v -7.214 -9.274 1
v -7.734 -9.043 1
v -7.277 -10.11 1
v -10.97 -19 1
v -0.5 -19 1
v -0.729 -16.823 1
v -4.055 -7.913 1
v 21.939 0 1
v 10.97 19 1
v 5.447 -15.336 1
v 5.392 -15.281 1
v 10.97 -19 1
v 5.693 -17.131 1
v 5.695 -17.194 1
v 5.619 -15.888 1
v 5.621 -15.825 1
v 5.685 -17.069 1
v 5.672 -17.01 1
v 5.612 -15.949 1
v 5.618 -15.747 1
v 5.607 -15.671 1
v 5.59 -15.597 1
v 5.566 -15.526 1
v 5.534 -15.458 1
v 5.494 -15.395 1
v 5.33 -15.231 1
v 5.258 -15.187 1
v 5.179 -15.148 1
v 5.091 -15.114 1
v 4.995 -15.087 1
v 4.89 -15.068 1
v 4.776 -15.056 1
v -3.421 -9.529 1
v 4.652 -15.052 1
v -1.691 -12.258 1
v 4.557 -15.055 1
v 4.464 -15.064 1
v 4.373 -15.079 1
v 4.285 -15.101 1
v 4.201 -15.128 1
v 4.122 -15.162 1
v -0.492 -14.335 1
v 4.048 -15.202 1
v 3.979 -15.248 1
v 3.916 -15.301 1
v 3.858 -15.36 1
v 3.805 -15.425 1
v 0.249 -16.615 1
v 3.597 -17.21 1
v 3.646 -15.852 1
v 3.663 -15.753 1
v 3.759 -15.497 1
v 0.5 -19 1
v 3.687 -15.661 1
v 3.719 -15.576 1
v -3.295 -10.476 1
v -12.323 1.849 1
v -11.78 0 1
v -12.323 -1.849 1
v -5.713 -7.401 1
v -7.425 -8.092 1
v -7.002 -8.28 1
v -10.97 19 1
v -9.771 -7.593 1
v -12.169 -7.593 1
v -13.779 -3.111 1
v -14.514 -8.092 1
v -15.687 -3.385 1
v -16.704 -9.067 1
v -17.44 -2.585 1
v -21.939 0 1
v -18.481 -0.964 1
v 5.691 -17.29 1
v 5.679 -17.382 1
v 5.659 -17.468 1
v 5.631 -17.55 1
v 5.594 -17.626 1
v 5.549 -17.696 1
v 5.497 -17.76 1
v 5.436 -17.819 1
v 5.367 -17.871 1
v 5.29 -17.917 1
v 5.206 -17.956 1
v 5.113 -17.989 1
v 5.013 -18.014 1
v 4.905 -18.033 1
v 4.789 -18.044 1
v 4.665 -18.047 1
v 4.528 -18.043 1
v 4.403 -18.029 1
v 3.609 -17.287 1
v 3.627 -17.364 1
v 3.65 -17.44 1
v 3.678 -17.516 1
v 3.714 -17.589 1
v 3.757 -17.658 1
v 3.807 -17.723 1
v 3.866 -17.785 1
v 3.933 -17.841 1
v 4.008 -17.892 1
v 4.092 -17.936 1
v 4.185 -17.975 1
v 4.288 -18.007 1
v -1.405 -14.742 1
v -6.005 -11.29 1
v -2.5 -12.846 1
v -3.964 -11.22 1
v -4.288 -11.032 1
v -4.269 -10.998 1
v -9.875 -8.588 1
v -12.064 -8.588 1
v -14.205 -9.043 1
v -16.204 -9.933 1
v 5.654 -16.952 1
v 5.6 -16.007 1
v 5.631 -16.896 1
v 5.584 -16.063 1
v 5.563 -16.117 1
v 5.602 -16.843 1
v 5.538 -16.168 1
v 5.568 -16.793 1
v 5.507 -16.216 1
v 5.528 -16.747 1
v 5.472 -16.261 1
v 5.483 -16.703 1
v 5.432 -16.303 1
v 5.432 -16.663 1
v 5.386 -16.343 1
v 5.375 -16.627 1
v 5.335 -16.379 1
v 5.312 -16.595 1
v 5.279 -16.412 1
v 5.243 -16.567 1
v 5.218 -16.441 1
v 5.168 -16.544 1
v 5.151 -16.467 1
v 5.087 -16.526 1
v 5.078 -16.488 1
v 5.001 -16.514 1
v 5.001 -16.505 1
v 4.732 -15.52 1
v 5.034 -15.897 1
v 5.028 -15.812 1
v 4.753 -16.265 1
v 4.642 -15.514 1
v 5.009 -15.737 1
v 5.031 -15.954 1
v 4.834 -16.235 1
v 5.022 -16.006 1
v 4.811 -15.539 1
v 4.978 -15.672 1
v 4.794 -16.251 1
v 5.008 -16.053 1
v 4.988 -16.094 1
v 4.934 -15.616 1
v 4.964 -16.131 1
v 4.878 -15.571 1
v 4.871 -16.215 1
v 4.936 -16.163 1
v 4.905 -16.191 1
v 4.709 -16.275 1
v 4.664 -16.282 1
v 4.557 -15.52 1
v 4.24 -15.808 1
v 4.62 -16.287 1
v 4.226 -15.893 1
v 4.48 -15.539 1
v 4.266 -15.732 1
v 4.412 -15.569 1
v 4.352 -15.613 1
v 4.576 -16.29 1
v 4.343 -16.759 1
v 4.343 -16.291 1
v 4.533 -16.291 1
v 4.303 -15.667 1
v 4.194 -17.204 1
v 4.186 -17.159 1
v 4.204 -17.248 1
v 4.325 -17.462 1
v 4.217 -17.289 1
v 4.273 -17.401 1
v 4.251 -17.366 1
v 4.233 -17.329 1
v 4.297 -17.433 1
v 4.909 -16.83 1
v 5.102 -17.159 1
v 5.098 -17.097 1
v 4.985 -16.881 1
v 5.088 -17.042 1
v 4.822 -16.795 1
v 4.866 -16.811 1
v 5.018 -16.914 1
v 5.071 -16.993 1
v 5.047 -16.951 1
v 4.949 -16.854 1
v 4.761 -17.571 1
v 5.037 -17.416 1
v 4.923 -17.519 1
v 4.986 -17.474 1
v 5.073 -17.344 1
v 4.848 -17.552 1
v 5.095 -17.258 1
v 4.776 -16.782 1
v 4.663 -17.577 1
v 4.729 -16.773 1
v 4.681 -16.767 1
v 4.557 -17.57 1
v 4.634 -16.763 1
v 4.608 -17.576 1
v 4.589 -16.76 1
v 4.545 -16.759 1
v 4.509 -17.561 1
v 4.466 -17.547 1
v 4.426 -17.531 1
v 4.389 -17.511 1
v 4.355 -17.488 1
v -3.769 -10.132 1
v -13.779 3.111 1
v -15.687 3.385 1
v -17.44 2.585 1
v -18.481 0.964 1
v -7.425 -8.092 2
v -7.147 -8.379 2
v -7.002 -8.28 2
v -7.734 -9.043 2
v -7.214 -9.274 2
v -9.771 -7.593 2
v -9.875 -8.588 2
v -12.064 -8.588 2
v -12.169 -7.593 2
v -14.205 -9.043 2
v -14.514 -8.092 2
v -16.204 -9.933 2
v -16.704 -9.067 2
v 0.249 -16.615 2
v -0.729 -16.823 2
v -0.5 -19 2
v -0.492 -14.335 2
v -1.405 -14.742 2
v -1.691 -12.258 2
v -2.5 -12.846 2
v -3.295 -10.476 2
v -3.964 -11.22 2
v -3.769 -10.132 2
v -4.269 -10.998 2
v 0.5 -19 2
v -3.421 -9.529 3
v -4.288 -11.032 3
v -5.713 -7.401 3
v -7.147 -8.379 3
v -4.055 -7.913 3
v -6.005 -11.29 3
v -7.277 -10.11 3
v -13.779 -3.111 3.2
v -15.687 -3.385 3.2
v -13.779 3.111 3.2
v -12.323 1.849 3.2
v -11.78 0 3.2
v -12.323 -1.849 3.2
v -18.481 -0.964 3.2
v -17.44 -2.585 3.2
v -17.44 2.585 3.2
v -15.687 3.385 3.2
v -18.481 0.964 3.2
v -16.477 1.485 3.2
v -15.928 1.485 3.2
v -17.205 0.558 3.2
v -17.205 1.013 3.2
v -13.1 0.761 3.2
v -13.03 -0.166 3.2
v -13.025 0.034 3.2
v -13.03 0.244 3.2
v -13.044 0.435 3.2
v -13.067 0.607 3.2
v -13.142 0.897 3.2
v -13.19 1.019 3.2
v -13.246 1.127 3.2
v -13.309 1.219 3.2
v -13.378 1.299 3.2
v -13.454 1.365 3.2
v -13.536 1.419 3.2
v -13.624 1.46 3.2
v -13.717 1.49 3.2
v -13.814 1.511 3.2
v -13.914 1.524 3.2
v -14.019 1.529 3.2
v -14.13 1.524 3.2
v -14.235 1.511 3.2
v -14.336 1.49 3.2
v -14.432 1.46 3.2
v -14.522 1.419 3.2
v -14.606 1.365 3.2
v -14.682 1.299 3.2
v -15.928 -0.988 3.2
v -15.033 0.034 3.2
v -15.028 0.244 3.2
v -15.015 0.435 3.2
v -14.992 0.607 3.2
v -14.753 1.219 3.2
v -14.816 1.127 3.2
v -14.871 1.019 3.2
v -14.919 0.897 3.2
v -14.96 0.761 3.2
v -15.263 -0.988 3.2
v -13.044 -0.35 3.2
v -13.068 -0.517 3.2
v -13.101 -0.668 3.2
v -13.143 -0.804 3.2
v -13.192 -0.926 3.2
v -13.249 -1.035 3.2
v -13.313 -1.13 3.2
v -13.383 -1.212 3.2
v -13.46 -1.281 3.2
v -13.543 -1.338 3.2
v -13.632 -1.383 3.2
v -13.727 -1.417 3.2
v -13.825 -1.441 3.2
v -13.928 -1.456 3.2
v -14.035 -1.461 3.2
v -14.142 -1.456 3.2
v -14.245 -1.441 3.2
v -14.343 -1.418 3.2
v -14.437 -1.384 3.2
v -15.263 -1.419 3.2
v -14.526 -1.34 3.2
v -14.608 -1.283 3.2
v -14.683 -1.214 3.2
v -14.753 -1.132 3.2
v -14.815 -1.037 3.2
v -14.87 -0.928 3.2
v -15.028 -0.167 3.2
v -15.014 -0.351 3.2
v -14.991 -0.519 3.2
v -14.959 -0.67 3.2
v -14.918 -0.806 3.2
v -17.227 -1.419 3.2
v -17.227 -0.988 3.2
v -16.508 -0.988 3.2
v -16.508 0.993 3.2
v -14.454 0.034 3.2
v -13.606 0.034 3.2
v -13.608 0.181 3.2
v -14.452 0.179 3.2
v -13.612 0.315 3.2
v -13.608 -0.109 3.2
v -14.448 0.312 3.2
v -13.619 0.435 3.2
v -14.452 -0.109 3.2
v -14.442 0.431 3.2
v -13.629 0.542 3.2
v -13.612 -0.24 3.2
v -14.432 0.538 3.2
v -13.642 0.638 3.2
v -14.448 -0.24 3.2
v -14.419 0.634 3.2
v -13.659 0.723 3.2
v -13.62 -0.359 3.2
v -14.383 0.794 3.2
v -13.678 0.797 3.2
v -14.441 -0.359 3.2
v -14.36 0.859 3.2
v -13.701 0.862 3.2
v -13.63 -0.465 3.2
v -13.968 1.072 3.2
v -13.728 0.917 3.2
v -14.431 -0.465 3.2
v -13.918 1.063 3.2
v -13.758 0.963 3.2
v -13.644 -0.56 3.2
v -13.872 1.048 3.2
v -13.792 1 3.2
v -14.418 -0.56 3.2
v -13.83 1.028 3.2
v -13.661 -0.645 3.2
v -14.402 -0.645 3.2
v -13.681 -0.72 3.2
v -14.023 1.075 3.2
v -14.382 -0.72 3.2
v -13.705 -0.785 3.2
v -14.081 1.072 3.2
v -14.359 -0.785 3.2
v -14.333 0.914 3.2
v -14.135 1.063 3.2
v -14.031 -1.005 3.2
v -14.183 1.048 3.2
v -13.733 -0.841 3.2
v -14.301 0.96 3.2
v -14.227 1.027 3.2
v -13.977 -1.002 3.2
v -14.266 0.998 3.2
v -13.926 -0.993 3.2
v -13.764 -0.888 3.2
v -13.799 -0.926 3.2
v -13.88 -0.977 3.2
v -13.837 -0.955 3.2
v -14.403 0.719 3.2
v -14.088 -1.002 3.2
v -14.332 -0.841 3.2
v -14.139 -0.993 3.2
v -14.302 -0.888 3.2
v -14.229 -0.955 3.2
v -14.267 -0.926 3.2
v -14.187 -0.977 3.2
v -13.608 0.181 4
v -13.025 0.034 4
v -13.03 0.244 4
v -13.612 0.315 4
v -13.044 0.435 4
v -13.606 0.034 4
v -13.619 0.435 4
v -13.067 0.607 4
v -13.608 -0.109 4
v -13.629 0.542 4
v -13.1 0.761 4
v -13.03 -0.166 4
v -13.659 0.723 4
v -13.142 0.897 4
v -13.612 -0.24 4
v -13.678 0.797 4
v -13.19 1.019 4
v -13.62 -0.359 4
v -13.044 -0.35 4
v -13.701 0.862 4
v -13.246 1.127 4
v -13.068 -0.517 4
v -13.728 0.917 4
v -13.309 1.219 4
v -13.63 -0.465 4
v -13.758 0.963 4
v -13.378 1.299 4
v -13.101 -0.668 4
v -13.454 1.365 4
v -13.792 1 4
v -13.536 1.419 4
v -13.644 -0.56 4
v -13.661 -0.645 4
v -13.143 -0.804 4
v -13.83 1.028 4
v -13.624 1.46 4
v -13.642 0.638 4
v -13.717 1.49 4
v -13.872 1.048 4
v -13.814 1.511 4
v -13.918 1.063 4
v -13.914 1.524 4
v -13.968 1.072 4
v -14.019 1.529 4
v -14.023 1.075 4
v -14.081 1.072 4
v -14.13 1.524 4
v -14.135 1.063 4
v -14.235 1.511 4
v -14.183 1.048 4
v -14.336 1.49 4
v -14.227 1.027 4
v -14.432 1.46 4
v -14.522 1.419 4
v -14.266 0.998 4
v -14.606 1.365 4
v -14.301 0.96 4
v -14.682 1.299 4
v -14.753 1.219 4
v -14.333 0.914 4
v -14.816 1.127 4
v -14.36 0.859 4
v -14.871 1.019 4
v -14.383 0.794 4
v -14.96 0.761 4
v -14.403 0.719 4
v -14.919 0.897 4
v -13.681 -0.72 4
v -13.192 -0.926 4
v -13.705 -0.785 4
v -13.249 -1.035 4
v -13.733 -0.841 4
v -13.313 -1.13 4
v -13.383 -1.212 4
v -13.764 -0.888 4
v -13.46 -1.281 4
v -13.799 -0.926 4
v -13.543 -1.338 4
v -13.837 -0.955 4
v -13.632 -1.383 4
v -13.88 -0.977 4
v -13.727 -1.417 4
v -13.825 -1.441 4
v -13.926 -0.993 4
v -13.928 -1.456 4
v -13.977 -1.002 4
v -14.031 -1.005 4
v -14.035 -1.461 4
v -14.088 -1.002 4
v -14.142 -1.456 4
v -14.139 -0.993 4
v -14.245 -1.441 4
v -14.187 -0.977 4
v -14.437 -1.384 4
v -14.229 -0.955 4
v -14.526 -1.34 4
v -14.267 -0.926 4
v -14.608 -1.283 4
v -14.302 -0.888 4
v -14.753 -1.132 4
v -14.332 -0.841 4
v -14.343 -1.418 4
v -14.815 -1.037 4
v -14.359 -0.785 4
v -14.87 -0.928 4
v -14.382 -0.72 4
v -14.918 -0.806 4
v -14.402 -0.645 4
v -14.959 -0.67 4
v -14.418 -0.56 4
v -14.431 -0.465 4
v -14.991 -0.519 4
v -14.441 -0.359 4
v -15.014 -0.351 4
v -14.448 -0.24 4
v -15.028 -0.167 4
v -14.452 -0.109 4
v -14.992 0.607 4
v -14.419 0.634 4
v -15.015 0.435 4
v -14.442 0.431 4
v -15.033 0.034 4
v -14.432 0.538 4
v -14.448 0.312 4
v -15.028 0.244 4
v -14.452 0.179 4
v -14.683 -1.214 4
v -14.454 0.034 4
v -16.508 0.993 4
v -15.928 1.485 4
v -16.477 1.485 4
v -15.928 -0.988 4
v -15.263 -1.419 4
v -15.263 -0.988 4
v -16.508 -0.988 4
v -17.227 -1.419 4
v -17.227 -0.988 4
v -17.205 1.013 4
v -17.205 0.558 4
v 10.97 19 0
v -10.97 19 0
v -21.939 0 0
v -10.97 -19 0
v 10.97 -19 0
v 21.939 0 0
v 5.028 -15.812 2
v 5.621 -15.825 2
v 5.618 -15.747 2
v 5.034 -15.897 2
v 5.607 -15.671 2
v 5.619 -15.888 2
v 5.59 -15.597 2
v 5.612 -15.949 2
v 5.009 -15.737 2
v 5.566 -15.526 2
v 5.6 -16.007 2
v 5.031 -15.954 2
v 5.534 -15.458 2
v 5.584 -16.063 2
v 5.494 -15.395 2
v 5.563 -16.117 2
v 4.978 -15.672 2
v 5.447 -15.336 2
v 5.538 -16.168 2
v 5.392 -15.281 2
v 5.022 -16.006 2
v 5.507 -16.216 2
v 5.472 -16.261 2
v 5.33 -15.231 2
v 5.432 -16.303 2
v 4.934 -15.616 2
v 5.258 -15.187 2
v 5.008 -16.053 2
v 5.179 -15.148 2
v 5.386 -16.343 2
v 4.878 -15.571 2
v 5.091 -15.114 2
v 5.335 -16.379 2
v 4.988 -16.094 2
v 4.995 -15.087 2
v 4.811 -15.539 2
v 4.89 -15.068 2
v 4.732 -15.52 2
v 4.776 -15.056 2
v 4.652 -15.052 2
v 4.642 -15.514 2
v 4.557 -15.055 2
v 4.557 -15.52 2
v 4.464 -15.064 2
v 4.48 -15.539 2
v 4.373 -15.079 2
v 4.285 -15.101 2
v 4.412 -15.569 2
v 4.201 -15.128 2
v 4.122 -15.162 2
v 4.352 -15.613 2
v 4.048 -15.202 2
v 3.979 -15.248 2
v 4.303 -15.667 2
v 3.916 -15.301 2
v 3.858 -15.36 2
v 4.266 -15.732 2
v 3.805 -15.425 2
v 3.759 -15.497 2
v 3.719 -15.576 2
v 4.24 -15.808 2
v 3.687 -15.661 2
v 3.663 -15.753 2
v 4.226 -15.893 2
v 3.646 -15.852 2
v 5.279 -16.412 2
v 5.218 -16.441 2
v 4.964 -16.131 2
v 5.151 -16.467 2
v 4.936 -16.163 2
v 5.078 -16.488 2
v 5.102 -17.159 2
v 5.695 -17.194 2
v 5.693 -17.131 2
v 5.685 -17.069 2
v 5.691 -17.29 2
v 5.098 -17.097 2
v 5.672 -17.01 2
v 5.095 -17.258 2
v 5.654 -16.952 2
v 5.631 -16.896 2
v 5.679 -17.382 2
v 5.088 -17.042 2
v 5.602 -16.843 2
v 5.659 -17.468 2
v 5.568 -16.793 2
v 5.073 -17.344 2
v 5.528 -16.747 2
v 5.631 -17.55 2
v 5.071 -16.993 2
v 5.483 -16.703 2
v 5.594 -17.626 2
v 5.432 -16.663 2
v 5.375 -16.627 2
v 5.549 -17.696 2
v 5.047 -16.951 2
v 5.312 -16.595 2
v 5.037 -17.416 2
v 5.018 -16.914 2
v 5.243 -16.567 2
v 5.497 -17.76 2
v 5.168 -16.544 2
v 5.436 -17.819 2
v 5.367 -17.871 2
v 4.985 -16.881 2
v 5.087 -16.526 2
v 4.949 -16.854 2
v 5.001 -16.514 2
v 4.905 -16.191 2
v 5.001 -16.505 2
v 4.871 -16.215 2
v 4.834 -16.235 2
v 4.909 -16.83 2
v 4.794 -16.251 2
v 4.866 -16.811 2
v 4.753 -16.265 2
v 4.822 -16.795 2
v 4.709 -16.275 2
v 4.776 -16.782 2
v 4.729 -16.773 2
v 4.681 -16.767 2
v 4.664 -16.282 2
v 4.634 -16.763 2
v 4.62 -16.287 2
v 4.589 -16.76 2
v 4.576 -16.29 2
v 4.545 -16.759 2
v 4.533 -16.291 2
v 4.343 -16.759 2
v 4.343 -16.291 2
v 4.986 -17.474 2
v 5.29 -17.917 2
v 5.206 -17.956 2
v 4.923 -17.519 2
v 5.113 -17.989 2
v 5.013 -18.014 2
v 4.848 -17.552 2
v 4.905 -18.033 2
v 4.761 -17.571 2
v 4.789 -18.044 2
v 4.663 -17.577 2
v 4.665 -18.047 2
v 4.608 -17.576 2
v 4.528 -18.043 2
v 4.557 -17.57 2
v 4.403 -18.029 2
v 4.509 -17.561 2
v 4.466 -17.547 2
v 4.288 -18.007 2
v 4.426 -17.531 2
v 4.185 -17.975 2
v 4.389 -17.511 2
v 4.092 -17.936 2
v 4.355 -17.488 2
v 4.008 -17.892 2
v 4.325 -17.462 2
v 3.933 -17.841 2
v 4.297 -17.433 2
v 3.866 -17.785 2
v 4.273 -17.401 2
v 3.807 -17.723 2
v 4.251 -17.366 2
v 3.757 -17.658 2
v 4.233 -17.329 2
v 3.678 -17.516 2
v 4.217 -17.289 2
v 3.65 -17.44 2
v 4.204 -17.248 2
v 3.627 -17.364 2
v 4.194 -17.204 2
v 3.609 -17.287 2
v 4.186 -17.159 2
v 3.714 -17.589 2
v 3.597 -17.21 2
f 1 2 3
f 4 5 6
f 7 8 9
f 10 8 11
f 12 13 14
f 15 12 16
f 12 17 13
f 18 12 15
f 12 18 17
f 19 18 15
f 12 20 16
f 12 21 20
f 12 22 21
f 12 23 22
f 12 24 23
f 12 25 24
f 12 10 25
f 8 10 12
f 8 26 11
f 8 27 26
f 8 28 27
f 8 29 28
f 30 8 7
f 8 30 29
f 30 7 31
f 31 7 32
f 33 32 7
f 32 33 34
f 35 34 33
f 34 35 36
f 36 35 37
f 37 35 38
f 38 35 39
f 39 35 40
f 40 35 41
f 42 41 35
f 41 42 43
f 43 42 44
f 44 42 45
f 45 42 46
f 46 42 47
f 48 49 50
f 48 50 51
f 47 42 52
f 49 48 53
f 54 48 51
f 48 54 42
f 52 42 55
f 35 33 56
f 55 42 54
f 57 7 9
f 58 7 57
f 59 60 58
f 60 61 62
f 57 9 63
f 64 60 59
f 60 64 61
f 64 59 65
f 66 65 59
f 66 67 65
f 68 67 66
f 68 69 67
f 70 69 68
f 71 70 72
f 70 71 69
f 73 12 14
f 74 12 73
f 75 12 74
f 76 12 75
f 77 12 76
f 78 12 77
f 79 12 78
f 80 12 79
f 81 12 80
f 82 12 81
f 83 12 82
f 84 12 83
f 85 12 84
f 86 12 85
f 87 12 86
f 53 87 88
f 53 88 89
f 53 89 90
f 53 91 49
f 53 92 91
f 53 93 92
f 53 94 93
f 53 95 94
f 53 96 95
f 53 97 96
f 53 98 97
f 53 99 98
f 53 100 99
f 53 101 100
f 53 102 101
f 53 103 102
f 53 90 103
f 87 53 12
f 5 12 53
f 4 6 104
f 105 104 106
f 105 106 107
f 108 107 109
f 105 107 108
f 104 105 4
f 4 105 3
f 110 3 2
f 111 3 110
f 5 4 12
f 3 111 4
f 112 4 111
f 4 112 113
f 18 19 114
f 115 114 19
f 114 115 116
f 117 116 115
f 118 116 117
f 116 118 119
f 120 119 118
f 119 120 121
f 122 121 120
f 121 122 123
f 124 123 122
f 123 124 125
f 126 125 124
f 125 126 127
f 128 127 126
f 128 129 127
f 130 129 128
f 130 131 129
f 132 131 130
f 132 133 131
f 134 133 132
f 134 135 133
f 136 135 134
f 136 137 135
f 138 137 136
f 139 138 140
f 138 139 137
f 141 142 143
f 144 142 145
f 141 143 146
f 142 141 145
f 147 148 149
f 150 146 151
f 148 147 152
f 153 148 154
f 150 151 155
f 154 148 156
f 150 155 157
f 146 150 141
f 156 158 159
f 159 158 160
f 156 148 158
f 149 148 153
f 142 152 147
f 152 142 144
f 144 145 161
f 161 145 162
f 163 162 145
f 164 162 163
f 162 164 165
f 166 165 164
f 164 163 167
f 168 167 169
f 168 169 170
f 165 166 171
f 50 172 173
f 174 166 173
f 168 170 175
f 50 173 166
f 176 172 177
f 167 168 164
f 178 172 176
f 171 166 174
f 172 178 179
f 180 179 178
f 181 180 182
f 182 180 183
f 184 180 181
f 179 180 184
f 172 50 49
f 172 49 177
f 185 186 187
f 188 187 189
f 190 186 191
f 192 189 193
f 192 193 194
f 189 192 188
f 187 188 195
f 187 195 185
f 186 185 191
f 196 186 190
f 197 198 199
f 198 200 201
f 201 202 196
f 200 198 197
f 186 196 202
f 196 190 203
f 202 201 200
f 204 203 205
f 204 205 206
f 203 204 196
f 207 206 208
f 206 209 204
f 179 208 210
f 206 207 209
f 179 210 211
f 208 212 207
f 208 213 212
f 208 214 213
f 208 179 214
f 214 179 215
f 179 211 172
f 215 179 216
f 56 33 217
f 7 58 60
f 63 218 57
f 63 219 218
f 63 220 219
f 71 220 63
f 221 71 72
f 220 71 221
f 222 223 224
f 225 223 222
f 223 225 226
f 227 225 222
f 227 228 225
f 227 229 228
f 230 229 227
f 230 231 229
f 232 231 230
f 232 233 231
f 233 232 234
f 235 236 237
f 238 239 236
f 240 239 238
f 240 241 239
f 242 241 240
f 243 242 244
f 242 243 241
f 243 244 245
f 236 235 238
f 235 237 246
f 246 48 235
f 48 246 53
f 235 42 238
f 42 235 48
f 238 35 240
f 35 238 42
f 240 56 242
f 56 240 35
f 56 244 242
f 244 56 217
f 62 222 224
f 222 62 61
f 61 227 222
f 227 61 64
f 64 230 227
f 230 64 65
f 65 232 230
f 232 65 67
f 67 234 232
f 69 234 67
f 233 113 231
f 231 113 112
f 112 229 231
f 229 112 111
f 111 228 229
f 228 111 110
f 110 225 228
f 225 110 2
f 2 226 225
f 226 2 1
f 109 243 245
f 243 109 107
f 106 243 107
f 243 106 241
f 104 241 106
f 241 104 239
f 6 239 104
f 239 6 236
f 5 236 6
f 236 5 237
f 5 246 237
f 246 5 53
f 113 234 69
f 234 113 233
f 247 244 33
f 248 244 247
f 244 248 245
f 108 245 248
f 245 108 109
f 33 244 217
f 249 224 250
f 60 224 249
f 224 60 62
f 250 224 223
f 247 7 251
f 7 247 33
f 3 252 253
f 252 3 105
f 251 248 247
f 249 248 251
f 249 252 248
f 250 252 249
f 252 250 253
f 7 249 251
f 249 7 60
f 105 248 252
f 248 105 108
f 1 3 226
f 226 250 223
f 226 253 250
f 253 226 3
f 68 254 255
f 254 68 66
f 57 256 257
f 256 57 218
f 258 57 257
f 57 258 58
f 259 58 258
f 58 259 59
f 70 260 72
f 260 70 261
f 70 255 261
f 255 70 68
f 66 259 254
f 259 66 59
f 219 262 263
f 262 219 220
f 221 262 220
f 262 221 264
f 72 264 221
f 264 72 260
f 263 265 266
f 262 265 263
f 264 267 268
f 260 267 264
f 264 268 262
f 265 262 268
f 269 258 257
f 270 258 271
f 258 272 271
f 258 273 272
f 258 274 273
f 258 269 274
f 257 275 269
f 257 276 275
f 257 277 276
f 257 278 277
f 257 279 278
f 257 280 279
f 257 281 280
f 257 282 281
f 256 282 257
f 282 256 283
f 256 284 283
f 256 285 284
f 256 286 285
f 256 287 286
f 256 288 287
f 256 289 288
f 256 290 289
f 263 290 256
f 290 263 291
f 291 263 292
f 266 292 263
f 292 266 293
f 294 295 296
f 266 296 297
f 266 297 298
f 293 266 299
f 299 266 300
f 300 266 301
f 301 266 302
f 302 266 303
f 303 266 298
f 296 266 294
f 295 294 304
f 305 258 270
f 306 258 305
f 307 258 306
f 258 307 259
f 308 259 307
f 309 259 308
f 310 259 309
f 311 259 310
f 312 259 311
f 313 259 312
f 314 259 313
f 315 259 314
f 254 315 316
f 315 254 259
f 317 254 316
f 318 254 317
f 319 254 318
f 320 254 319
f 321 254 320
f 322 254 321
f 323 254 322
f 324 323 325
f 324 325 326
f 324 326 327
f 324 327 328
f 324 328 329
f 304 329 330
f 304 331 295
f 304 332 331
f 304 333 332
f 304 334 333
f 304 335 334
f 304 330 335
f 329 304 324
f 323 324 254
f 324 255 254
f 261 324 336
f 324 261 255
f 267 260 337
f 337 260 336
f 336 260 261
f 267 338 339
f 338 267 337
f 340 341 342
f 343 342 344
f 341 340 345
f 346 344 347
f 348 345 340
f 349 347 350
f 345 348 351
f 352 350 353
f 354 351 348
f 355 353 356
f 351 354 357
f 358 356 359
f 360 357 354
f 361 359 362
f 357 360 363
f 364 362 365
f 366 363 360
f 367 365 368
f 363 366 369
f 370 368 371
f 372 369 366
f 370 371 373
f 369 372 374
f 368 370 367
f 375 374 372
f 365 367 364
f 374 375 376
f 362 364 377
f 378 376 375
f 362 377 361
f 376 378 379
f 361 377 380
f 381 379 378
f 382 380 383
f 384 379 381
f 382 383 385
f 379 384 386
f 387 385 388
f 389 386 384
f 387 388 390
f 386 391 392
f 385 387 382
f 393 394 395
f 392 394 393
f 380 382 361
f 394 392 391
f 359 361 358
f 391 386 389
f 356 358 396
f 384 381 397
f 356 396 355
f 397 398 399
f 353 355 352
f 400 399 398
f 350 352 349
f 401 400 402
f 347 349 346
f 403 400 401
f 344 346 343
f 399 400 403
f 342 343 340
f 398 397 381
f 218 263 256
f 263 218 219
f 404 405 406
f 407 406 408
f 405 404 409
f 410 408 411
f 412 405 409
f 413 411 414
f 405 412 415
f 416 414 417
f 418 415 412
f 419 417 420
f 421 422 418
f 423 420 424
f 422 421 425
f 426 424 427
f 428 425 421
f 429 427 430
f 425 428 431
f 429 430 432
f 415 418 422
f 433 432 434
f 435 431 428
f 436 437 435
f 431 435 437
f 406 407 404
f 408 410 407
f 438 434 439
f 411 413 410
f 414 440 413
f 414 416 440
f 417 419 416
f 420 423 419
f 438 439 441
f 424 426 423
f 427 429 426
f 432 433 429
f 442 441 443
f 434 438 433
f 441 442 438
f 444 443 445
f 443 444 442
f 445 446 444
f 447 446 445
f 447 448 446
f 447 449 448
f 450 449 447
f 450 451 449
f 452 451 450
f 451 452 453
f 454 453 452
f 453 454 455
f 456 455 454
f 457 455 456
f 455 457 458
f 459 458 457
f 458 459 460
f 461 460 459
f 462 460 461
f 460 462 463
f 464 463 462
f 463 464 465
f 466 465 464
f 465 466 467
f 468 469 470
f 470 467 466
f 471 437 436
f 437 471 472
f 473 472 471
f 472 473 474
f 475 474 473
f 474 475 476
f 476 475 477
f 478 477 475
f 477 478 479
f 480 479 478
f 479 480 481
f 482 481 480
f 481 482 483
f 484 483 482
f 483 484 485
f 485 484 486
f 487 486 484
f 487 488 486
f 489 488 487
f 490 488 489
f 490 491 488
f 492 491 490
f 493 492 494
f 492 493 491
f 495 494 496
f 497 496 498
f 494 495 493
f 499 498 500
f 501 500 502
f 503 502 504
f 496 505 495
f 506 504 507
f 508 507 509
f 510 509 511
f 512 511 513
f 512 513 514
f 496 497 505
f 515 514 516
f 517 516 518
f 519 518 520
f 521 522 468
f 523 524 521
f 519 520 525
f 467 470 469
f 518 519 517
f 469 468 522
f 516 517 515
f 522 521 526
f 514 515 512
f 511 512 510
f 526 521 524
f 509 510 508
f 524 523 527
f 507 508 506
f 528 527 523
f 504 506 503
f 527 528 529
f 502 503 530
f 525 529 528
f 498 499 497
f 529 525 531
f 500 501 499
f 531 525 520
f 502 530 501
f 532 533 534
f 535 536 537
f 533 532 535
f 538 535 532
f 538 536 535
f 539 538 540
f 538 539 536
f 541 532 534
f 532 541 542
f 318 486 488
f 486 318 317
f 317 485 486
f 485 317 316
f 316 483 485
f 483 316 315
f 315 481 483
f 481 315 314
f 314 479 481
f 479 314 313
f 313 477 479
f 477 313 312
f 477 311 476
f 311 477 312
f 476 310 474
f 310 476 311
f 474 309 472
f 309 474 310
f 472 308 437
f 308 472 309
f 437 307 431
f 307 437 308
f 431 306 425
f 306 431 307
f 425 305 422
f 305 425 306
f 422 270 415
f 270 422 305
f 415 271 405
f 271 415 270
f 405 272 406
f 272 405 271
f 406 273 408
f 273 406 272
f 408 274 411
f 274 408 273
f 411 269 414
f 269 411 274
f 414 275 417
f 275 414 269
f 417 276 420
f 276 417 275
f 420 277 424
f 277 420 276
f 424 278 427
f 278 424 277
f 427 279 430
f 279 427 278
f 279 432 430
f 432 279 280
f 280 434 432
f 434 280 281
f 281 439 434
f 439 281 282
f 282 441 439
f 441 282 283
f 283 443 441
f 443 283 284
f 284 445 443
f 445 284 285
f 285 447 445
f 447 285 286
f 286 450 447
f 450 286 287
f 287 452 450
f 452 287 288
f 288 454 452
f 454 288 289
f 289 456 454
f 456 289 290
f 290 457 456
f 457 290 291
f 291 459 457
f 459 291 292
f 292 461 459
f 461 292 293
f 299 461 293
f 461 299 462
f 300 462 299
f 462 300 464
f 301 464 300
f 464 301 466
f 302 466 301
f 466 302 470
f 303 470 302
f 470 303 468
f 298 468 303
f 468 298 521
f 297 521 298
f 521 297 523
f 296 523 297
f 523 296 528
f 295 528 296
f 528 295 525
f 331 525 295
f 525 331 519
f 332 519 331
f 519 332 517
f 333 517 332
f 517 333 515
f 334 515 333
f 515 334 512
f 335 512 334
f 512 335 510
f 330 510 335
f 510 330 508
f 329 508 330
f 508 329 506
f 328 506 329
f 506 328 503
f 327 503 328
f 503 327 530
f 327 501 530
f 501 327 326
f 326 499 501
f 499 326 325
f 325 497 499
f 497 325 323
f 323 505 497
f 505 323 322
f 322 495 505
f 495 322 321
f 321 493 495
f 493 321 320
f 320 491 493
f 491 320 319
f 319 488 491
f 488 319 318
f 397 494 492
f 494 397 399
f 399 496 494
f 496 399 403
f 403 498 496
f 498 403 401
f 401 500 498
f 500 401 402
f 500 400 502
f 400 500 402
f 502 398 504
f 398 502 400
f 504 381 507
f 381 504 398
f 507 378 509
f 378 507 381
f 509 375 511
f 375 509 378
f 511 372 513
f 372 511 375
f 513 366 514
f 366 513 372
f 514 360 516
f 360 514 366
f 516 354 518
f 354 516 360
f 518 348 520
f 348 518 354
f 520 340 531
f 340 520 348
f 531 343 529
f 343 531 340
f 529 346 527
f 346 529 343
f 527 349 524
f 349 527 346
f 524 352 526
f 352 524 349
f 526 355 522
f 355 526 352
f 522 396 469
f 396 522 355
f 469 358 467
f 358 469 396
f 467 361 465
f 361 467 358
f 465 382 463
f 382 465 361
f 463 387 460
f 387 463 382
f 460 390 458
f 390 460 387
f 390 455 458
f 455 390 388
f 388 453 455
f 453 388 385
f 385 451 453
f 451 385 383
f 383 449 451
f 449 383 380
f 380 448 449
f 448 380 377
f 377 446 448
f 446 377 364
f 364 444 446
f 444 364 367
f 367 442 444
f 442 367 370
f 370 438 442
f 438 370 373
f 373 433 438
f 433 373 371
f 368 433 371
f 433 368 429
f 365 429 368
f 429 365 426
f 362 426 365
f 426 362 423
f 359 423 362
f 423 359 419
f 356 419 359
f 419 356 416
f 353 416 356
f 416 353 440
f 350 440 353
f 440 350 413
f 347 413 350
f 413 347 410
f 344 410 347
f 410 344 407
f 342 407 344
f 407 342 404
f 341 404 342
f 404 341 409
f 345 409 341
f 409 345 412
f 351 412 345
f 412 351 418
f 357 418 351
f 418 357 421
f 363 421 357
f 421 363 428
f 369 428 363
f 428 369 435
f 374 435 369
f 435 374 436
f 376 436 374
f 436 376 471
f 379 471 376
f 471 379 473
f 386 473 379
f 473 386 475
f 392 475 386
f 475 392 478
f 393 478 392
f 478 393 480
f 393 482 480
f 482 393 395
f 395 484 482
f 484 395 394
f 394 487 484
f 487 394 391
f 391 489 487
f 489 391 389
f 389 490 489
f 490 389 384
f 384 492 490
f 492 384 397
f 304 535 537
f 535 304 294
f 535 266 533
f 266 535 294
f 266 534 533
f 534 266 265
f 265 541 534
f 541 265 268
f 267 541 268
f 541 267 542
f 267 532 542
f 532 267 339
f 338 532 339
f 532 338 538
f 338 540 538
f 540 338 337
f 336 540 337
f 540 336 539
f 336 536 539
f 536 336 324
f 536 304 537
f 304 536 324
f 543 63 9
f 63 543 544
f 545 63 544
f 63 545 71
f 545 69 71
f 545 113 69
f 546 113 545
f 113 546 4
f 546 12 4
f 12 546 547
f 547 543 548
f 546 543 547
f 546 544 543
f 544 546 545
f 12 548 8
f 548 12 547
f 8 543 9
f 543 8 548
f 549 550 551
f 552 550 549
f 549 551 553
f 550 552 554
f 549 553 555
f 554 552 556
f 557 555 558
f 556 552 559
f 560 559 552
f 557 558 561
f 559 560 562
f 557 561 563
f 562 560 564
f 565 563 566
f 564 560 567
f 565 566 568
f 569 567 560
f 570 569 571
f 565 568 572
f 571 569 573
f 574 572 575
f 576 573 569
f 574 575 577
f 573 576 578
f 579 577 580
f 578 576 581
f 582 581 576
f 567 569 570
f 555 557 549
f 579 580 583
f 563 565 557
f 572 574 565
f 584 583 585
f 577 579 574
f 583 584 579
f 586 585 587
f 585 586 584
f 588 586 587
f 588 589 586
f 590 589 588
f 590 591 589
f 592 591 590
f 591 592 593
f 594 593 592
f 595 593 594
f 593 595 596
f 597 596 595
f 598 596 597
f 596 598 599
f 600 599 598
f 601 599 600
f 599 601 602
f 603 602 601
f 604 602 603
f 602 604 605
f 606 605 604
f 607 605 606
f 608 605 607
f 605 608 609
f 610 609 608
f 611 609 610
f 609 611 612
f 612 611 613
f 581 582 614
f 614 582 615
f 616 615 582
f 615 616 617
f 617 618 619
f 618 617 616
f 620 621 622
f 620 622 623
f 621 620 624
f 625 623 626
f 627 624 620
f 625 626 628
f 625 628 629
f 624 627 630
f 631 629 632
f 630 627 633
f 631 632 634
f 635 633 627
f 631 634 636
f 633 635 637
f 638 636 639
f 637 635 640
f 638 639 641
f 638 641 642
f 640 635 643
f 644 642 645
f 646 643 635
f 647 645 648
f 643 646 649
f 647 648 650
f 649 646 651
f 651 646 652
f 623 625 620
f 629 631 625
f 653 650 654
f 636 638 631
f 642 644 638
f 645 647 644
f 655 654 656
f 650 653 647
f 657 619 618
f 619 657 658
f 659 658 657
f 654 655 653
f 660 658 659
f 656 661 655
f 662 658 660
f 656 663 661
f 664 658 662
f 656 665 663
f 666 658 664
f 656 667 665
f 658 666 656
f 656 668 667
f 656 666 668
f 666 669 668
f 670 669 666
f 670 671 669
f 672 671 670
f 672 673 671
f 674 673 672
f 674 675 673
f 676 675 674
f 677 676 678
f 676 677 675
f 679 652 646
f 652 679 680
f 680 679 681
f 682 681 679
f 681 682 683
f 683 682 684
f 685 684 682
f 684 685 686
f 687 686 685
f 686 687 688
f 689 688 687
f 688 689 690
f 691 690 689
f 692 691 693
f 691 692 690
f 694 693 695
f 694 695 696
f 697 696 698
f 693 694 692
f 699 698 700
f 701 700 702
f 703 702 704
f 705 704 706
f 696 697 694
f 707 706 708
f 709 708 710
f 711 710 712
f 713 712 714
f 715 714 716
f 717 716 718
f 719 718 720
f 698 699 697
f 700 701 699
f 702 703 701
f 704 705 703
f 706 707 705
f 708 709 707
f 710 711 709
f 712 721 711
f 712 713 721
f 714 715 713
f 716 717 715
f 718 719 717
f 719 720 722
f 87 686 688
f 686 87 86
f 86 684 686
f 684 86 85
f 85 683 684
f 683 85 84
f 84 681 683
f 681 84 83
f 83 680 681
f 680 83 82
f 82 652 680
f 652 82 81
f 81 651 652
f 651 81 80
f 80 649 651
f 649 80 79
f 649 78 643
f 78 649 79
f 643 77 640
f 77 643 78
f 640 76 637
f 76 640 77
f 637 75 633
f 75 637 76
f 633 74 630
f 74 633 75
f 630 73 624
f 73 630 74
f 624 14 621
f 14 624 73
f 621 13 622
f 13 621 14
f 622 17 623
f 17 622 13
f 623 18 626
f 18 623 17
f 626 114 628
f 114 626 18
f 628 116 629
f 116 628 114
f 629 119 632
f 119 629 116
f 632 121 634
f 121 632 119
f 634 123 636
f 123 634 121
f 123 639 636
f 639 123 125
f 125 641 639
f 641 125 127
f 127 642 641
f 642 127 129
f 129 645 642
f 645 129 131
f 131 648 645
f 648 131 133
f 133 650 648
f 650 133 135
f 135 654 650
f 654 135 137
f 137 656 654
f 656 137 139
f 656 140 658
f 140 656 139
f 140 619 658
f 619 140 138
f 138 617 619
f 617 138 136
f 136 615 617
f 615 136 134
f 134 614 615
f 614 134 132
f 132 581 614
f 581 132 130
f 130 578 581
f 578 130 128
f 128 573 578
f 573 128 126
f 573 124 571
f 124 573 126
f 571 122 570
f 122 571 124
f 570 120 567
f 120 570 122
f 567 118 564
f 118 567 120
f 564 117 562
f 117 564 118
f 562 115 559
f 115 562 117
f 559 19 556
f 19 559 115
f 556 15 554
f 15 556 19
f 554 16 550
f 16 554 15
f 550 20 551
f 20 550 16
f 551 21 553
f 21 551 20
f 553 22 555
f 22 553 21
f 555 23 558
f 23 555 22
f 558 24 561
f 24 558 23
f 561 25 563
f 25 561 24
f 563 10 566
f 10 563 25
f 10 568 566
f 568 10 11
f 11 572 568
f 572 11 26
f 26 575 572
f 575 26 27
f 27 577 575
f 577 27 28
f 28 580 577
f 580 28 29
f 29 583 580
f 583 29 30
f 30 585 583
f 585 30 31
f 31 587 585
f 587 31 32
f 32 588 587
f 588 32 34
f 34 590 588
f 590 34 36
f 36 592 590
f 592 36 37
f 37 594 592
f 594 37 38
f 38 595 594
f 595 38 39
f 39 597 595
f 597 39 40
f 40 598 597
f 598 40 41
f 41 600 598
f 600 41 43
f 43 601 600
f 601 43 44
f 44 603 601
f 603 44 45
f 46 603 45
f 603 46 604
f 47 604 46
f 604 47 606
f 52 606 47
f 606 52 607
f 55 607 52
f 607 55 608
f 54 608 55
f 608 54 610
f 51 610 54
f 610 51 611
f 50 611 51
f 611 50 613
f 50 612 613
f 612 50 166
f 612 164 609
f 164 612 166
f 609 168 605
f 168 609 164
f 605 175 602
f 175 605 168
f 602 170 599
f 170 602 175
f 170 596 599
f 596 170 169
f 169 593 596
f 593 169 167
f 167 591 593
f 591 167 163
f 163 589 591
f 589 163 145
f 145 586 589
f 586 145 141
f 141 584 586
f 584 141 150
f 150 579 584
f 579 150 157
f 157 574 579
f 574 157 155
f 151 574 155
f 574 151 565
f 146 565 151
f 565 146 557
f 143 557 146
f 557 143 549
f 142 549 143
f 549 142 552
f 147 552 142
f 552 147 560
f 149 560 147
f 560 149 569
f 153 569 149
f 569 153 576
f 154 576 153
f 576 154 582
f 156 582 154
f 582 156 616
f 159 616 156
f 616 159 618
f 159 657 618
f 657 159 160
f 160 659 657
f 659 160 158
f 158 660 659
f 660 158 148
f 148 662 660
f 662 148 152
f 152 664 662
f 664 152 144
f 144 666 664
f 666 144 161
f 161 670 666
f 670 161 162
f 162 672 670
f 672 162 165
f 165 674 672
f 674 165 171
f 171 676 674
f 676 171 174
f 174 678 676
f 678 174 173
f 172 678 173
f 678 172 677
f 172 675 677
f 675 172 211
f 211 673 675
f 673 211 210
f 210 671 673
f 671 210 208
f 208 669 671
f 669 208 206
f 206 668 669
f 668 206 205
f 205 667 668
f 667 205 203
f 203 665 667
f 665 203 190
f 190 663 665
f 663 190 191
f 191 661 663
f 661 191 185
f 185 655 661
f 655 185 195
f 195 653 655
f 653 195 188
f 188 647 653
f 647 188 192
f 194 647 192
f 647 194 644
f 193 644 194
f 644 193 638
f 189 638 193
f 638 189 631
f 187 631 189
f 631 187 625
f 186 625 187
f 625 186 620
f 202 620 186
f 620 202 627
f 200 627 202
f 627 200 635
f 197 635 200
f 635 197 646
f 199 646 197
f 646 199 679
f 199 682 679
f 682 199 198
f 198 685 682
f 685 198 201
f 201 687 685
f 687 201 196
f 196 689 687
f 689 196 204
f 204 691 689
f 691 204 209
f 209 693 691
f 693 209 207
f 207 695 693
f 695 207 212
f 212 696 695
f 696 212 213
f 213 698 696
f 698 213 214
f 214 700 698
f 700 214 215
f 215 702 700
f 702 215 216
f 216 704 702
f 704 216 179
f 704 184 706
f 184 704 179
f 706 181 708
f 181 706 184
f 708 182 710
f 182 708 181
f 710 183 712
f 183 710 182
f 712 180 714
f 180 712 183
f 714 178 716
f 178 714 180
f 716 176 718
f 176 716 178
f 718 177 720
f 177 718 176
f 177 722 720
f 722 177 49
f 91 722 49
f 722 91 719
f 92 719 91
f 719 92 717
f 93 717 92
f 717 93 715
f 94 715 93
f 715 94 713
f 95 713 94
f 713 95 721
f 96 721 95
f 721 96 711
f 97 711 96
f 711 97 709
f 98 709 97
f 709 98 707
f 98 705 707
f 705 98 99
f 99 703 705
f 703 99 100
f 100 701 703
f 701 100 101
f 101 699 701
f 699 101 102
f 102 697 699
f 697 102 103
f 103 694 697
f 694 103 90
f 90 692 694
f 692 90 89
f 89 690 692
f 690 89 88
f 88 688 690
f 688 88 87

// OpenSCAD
include <../Scripts/18xx tiles basic functions.scad>
hex();
put_tilenr("3");
small_town_sharp_curve(r=5);
put_value("10",-90);
